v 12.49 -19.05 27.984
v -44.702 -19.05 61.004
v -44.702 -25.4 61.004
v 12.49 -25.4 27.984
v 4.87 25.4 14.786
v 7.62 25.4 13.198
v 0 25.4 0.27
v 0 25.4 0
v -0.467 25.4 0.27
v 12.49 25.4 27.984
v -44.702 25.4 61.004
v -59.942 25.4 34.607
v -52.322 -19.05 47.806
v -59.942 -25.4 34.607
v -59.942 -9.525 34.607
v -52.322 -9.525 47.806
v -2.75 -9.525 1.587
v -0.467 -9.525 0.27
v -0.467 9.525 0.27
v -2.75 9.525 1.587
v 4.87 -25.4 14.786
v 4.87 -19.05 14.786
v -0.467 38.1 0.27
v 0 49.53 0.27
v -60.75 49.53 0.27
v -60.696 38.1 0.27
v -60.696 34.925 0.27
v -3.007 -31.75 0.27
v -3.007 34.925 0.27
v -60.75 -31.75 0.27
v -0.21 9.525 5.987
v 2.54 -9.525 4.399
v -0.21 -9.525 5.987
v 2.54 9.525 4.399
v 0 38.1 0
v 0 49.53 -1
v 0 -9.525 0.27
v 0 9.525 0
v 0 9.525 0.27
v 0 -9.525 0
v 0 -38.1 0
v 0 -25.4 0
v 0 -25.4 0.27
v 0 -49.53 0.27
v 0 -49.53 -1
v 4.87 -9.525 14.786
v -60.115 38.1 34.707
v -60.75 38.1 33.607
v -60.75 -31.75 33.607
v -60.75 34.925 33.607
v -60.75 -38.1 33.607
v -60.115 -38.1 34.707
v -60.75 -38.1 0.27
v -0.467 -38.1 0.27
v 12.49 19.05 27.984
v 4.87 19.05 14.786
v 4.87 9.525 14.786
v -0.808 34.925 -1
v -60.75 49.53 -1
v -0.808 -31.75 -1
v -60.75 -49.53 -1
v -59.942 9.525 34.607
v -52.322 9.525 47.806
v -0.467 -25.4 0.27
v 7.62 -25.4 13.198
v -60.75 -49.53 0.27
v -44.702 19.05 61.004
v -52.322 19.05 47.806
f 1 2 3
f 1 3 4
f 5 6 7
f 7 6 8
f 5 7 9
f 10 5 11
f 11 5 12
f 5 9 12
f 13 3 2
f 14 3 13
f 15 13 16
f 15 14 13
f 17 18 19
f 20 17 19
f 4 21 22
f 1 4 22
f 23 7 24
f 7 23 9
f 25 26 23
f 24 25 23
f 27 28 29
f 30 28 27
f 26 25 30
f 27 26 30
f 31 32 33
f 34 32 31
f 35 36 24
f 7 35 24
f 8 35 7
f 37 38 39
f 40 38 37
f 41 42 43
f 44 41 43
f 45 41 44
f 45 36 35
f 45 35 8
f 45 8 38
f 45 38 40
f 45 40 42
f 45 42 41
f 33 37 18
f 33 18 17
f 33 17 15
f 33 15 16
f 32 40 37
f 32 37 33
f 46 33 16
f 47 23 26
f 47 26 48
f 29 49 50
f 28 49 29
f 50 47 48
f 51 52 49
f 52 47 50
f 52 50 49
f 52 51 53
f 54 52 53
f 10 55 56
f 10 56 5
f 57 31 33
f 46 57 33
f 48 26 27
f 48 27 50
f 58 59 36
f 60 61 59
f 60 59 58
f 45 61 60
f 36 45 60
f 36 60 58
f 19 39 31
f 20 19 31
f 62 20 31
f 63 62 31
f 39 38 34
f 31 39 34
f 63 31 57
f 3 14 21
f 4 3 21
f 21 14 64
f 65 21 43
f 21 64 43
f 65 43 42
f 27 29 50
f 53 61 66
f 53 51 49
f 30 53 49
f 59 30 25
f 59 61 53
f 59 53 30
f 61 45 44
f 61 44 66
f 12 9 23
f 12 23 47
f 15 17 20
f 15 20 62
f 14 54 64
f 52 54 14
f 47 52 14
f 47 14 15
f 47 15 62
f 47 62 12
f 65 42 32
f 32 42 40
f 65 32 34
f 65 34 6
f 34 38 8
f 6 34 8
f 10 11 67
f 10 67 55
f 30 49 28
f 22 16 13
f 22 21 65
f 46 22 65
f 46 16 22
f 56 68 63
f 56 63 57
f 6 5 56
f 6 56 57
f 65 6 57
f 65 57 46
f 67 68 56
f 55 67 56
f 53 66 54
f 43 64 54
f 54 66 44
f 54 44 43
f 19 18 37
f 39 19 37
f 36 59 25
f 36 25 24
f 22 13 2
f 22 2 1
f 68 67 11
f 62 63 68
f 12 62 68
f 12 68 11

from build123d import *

# Parameters (mm, degrees)
F1_DEPTH  = 38.1
F2_W      = 66.04
F2_H      = 9.525
F3_DEPTH  = 15.24
F2_H_2    = 6.35
F4_DEPTH  = 30.48
F5_DEPTH  = 15.24
F6_W      = 19.05
F6_H      = 5.08
F7_DEPTH  = 3.175
F9_DEPTH  = 6.35
F11_DEPTH = 3.175
F13_DEPTH = 1.27


with BuildPart() as f1:
    # F0 (on Front) → F1 (new body, symmetric)
    with BuildSketch(Plane.XZ):
        Polygon((-0.8076530991, -1.0001709495), (0, 0), (-60.1146014221, 34.7071813133), (-60.7496014221, 33.6073290505), align=None)
    extrude(amount=F1_DEPTH, both=True)

    # F2 (on face) → F3 (join)
    with BuildSketch(Plane(origin=(0, 0, 0), x_dir=(0.8660254038, 0, -0.5), z_dir=(0.5, 0, 0.8660254038))):
        with Locations((-36.195, -14.2875)):
            Rectangle(F2_W, F2_H)
        with Locations((-36.195, 14.2875)):
            Rectangle(F2_W, F2_H)
    extrude(amount=F3_DEPTH)

    # F2 (on face) → F4 (join)
    with BuildSketch(Plane(origin=(0, 0, 0), x_dir=(0.8660254038, 0, -0.5), z_dir=(0.5, 0, 0.8660254038))):
        with Locations((-36.195, -22.225)):
            Rectangle(F2_W, F2_H_2)
        with Locations((-36.195, 22.225)):
            Rectangle(F2_W, F2_H_2)
    extrude(amount=F4_DEPTH)

    # F2 (on face) → F5 (join)
    with BuildSketch(Plane(origin=(0, 0, 0), x_dir=(0.8660254038, 0, -0.5), z_dir=(0.5, 0, 0.8660254038))):
        Polygon((0, 25.4), (-3.175, 25.4), (-3.175, 19.05), (-3.175, 9.525), (-3.175, -9.525), (-3.175, -19.05), (-3.175, -25.4), (0, -25.4), align=None)
    extrude(amount=F5_DEPTH)

    # F6 (on face) → F7 (cut)
    with BuildSketch(Plane(origin=(0, 0, 0), x_dir=(0, 1, 0), z_dir=(0.8660254038, 0, -0.5))):
        with Locations((0, 2.54)):
            Rectangle(F6_W, F6_H)
    extrude(amount=-F7_DEPTH, mode=Mode.SUBTRACT)

    # F8 (on face) → F9 (join)
    with BuildSketch(Plane.XZ.offset(38.1)):
        Polygon((-60.7496014221, -1.0001709495), (-0.8076530991, -1.0001709495), (-60.7496014221, 33.6073290505), align=None)
    extrude(amount=-F9_DEPTH)

    # F10 (on face) → F11 (join)
    with BuildSketch(Plane(origin=(0, 38.1, 0), x_dir=(-1, 0, 0), z_dir=(0, 1, 0))):
        Polygon((60.7496014221, 33.6073290505), (0.8076530991, -1.0001709495), (60.6936737895, -1.0001709495), align=None)
    extrude(amount=-F11_DEPTH)

    # F12 (on face) → F13 (join)
    with BuildSketch(Plane(origin=(0, 0, -1.0001709495), x_dir=(1, 0, 0), z_dir=(0, 0, -1))):
        Polygon((0, 49.53), (-60.7496014221, 49.53), (-60.7496014221, 38.1), (-0.8076530991, 38.1), (-0.8076530991, 31.75), (-60.7496014221, 31.75), (-60.7496014221, -49.53), (0, -49.53), (0, -9.525), (0, 9.525), align=None)
    extrude(amount=-F13_DEPTH)


solid = f1.part
